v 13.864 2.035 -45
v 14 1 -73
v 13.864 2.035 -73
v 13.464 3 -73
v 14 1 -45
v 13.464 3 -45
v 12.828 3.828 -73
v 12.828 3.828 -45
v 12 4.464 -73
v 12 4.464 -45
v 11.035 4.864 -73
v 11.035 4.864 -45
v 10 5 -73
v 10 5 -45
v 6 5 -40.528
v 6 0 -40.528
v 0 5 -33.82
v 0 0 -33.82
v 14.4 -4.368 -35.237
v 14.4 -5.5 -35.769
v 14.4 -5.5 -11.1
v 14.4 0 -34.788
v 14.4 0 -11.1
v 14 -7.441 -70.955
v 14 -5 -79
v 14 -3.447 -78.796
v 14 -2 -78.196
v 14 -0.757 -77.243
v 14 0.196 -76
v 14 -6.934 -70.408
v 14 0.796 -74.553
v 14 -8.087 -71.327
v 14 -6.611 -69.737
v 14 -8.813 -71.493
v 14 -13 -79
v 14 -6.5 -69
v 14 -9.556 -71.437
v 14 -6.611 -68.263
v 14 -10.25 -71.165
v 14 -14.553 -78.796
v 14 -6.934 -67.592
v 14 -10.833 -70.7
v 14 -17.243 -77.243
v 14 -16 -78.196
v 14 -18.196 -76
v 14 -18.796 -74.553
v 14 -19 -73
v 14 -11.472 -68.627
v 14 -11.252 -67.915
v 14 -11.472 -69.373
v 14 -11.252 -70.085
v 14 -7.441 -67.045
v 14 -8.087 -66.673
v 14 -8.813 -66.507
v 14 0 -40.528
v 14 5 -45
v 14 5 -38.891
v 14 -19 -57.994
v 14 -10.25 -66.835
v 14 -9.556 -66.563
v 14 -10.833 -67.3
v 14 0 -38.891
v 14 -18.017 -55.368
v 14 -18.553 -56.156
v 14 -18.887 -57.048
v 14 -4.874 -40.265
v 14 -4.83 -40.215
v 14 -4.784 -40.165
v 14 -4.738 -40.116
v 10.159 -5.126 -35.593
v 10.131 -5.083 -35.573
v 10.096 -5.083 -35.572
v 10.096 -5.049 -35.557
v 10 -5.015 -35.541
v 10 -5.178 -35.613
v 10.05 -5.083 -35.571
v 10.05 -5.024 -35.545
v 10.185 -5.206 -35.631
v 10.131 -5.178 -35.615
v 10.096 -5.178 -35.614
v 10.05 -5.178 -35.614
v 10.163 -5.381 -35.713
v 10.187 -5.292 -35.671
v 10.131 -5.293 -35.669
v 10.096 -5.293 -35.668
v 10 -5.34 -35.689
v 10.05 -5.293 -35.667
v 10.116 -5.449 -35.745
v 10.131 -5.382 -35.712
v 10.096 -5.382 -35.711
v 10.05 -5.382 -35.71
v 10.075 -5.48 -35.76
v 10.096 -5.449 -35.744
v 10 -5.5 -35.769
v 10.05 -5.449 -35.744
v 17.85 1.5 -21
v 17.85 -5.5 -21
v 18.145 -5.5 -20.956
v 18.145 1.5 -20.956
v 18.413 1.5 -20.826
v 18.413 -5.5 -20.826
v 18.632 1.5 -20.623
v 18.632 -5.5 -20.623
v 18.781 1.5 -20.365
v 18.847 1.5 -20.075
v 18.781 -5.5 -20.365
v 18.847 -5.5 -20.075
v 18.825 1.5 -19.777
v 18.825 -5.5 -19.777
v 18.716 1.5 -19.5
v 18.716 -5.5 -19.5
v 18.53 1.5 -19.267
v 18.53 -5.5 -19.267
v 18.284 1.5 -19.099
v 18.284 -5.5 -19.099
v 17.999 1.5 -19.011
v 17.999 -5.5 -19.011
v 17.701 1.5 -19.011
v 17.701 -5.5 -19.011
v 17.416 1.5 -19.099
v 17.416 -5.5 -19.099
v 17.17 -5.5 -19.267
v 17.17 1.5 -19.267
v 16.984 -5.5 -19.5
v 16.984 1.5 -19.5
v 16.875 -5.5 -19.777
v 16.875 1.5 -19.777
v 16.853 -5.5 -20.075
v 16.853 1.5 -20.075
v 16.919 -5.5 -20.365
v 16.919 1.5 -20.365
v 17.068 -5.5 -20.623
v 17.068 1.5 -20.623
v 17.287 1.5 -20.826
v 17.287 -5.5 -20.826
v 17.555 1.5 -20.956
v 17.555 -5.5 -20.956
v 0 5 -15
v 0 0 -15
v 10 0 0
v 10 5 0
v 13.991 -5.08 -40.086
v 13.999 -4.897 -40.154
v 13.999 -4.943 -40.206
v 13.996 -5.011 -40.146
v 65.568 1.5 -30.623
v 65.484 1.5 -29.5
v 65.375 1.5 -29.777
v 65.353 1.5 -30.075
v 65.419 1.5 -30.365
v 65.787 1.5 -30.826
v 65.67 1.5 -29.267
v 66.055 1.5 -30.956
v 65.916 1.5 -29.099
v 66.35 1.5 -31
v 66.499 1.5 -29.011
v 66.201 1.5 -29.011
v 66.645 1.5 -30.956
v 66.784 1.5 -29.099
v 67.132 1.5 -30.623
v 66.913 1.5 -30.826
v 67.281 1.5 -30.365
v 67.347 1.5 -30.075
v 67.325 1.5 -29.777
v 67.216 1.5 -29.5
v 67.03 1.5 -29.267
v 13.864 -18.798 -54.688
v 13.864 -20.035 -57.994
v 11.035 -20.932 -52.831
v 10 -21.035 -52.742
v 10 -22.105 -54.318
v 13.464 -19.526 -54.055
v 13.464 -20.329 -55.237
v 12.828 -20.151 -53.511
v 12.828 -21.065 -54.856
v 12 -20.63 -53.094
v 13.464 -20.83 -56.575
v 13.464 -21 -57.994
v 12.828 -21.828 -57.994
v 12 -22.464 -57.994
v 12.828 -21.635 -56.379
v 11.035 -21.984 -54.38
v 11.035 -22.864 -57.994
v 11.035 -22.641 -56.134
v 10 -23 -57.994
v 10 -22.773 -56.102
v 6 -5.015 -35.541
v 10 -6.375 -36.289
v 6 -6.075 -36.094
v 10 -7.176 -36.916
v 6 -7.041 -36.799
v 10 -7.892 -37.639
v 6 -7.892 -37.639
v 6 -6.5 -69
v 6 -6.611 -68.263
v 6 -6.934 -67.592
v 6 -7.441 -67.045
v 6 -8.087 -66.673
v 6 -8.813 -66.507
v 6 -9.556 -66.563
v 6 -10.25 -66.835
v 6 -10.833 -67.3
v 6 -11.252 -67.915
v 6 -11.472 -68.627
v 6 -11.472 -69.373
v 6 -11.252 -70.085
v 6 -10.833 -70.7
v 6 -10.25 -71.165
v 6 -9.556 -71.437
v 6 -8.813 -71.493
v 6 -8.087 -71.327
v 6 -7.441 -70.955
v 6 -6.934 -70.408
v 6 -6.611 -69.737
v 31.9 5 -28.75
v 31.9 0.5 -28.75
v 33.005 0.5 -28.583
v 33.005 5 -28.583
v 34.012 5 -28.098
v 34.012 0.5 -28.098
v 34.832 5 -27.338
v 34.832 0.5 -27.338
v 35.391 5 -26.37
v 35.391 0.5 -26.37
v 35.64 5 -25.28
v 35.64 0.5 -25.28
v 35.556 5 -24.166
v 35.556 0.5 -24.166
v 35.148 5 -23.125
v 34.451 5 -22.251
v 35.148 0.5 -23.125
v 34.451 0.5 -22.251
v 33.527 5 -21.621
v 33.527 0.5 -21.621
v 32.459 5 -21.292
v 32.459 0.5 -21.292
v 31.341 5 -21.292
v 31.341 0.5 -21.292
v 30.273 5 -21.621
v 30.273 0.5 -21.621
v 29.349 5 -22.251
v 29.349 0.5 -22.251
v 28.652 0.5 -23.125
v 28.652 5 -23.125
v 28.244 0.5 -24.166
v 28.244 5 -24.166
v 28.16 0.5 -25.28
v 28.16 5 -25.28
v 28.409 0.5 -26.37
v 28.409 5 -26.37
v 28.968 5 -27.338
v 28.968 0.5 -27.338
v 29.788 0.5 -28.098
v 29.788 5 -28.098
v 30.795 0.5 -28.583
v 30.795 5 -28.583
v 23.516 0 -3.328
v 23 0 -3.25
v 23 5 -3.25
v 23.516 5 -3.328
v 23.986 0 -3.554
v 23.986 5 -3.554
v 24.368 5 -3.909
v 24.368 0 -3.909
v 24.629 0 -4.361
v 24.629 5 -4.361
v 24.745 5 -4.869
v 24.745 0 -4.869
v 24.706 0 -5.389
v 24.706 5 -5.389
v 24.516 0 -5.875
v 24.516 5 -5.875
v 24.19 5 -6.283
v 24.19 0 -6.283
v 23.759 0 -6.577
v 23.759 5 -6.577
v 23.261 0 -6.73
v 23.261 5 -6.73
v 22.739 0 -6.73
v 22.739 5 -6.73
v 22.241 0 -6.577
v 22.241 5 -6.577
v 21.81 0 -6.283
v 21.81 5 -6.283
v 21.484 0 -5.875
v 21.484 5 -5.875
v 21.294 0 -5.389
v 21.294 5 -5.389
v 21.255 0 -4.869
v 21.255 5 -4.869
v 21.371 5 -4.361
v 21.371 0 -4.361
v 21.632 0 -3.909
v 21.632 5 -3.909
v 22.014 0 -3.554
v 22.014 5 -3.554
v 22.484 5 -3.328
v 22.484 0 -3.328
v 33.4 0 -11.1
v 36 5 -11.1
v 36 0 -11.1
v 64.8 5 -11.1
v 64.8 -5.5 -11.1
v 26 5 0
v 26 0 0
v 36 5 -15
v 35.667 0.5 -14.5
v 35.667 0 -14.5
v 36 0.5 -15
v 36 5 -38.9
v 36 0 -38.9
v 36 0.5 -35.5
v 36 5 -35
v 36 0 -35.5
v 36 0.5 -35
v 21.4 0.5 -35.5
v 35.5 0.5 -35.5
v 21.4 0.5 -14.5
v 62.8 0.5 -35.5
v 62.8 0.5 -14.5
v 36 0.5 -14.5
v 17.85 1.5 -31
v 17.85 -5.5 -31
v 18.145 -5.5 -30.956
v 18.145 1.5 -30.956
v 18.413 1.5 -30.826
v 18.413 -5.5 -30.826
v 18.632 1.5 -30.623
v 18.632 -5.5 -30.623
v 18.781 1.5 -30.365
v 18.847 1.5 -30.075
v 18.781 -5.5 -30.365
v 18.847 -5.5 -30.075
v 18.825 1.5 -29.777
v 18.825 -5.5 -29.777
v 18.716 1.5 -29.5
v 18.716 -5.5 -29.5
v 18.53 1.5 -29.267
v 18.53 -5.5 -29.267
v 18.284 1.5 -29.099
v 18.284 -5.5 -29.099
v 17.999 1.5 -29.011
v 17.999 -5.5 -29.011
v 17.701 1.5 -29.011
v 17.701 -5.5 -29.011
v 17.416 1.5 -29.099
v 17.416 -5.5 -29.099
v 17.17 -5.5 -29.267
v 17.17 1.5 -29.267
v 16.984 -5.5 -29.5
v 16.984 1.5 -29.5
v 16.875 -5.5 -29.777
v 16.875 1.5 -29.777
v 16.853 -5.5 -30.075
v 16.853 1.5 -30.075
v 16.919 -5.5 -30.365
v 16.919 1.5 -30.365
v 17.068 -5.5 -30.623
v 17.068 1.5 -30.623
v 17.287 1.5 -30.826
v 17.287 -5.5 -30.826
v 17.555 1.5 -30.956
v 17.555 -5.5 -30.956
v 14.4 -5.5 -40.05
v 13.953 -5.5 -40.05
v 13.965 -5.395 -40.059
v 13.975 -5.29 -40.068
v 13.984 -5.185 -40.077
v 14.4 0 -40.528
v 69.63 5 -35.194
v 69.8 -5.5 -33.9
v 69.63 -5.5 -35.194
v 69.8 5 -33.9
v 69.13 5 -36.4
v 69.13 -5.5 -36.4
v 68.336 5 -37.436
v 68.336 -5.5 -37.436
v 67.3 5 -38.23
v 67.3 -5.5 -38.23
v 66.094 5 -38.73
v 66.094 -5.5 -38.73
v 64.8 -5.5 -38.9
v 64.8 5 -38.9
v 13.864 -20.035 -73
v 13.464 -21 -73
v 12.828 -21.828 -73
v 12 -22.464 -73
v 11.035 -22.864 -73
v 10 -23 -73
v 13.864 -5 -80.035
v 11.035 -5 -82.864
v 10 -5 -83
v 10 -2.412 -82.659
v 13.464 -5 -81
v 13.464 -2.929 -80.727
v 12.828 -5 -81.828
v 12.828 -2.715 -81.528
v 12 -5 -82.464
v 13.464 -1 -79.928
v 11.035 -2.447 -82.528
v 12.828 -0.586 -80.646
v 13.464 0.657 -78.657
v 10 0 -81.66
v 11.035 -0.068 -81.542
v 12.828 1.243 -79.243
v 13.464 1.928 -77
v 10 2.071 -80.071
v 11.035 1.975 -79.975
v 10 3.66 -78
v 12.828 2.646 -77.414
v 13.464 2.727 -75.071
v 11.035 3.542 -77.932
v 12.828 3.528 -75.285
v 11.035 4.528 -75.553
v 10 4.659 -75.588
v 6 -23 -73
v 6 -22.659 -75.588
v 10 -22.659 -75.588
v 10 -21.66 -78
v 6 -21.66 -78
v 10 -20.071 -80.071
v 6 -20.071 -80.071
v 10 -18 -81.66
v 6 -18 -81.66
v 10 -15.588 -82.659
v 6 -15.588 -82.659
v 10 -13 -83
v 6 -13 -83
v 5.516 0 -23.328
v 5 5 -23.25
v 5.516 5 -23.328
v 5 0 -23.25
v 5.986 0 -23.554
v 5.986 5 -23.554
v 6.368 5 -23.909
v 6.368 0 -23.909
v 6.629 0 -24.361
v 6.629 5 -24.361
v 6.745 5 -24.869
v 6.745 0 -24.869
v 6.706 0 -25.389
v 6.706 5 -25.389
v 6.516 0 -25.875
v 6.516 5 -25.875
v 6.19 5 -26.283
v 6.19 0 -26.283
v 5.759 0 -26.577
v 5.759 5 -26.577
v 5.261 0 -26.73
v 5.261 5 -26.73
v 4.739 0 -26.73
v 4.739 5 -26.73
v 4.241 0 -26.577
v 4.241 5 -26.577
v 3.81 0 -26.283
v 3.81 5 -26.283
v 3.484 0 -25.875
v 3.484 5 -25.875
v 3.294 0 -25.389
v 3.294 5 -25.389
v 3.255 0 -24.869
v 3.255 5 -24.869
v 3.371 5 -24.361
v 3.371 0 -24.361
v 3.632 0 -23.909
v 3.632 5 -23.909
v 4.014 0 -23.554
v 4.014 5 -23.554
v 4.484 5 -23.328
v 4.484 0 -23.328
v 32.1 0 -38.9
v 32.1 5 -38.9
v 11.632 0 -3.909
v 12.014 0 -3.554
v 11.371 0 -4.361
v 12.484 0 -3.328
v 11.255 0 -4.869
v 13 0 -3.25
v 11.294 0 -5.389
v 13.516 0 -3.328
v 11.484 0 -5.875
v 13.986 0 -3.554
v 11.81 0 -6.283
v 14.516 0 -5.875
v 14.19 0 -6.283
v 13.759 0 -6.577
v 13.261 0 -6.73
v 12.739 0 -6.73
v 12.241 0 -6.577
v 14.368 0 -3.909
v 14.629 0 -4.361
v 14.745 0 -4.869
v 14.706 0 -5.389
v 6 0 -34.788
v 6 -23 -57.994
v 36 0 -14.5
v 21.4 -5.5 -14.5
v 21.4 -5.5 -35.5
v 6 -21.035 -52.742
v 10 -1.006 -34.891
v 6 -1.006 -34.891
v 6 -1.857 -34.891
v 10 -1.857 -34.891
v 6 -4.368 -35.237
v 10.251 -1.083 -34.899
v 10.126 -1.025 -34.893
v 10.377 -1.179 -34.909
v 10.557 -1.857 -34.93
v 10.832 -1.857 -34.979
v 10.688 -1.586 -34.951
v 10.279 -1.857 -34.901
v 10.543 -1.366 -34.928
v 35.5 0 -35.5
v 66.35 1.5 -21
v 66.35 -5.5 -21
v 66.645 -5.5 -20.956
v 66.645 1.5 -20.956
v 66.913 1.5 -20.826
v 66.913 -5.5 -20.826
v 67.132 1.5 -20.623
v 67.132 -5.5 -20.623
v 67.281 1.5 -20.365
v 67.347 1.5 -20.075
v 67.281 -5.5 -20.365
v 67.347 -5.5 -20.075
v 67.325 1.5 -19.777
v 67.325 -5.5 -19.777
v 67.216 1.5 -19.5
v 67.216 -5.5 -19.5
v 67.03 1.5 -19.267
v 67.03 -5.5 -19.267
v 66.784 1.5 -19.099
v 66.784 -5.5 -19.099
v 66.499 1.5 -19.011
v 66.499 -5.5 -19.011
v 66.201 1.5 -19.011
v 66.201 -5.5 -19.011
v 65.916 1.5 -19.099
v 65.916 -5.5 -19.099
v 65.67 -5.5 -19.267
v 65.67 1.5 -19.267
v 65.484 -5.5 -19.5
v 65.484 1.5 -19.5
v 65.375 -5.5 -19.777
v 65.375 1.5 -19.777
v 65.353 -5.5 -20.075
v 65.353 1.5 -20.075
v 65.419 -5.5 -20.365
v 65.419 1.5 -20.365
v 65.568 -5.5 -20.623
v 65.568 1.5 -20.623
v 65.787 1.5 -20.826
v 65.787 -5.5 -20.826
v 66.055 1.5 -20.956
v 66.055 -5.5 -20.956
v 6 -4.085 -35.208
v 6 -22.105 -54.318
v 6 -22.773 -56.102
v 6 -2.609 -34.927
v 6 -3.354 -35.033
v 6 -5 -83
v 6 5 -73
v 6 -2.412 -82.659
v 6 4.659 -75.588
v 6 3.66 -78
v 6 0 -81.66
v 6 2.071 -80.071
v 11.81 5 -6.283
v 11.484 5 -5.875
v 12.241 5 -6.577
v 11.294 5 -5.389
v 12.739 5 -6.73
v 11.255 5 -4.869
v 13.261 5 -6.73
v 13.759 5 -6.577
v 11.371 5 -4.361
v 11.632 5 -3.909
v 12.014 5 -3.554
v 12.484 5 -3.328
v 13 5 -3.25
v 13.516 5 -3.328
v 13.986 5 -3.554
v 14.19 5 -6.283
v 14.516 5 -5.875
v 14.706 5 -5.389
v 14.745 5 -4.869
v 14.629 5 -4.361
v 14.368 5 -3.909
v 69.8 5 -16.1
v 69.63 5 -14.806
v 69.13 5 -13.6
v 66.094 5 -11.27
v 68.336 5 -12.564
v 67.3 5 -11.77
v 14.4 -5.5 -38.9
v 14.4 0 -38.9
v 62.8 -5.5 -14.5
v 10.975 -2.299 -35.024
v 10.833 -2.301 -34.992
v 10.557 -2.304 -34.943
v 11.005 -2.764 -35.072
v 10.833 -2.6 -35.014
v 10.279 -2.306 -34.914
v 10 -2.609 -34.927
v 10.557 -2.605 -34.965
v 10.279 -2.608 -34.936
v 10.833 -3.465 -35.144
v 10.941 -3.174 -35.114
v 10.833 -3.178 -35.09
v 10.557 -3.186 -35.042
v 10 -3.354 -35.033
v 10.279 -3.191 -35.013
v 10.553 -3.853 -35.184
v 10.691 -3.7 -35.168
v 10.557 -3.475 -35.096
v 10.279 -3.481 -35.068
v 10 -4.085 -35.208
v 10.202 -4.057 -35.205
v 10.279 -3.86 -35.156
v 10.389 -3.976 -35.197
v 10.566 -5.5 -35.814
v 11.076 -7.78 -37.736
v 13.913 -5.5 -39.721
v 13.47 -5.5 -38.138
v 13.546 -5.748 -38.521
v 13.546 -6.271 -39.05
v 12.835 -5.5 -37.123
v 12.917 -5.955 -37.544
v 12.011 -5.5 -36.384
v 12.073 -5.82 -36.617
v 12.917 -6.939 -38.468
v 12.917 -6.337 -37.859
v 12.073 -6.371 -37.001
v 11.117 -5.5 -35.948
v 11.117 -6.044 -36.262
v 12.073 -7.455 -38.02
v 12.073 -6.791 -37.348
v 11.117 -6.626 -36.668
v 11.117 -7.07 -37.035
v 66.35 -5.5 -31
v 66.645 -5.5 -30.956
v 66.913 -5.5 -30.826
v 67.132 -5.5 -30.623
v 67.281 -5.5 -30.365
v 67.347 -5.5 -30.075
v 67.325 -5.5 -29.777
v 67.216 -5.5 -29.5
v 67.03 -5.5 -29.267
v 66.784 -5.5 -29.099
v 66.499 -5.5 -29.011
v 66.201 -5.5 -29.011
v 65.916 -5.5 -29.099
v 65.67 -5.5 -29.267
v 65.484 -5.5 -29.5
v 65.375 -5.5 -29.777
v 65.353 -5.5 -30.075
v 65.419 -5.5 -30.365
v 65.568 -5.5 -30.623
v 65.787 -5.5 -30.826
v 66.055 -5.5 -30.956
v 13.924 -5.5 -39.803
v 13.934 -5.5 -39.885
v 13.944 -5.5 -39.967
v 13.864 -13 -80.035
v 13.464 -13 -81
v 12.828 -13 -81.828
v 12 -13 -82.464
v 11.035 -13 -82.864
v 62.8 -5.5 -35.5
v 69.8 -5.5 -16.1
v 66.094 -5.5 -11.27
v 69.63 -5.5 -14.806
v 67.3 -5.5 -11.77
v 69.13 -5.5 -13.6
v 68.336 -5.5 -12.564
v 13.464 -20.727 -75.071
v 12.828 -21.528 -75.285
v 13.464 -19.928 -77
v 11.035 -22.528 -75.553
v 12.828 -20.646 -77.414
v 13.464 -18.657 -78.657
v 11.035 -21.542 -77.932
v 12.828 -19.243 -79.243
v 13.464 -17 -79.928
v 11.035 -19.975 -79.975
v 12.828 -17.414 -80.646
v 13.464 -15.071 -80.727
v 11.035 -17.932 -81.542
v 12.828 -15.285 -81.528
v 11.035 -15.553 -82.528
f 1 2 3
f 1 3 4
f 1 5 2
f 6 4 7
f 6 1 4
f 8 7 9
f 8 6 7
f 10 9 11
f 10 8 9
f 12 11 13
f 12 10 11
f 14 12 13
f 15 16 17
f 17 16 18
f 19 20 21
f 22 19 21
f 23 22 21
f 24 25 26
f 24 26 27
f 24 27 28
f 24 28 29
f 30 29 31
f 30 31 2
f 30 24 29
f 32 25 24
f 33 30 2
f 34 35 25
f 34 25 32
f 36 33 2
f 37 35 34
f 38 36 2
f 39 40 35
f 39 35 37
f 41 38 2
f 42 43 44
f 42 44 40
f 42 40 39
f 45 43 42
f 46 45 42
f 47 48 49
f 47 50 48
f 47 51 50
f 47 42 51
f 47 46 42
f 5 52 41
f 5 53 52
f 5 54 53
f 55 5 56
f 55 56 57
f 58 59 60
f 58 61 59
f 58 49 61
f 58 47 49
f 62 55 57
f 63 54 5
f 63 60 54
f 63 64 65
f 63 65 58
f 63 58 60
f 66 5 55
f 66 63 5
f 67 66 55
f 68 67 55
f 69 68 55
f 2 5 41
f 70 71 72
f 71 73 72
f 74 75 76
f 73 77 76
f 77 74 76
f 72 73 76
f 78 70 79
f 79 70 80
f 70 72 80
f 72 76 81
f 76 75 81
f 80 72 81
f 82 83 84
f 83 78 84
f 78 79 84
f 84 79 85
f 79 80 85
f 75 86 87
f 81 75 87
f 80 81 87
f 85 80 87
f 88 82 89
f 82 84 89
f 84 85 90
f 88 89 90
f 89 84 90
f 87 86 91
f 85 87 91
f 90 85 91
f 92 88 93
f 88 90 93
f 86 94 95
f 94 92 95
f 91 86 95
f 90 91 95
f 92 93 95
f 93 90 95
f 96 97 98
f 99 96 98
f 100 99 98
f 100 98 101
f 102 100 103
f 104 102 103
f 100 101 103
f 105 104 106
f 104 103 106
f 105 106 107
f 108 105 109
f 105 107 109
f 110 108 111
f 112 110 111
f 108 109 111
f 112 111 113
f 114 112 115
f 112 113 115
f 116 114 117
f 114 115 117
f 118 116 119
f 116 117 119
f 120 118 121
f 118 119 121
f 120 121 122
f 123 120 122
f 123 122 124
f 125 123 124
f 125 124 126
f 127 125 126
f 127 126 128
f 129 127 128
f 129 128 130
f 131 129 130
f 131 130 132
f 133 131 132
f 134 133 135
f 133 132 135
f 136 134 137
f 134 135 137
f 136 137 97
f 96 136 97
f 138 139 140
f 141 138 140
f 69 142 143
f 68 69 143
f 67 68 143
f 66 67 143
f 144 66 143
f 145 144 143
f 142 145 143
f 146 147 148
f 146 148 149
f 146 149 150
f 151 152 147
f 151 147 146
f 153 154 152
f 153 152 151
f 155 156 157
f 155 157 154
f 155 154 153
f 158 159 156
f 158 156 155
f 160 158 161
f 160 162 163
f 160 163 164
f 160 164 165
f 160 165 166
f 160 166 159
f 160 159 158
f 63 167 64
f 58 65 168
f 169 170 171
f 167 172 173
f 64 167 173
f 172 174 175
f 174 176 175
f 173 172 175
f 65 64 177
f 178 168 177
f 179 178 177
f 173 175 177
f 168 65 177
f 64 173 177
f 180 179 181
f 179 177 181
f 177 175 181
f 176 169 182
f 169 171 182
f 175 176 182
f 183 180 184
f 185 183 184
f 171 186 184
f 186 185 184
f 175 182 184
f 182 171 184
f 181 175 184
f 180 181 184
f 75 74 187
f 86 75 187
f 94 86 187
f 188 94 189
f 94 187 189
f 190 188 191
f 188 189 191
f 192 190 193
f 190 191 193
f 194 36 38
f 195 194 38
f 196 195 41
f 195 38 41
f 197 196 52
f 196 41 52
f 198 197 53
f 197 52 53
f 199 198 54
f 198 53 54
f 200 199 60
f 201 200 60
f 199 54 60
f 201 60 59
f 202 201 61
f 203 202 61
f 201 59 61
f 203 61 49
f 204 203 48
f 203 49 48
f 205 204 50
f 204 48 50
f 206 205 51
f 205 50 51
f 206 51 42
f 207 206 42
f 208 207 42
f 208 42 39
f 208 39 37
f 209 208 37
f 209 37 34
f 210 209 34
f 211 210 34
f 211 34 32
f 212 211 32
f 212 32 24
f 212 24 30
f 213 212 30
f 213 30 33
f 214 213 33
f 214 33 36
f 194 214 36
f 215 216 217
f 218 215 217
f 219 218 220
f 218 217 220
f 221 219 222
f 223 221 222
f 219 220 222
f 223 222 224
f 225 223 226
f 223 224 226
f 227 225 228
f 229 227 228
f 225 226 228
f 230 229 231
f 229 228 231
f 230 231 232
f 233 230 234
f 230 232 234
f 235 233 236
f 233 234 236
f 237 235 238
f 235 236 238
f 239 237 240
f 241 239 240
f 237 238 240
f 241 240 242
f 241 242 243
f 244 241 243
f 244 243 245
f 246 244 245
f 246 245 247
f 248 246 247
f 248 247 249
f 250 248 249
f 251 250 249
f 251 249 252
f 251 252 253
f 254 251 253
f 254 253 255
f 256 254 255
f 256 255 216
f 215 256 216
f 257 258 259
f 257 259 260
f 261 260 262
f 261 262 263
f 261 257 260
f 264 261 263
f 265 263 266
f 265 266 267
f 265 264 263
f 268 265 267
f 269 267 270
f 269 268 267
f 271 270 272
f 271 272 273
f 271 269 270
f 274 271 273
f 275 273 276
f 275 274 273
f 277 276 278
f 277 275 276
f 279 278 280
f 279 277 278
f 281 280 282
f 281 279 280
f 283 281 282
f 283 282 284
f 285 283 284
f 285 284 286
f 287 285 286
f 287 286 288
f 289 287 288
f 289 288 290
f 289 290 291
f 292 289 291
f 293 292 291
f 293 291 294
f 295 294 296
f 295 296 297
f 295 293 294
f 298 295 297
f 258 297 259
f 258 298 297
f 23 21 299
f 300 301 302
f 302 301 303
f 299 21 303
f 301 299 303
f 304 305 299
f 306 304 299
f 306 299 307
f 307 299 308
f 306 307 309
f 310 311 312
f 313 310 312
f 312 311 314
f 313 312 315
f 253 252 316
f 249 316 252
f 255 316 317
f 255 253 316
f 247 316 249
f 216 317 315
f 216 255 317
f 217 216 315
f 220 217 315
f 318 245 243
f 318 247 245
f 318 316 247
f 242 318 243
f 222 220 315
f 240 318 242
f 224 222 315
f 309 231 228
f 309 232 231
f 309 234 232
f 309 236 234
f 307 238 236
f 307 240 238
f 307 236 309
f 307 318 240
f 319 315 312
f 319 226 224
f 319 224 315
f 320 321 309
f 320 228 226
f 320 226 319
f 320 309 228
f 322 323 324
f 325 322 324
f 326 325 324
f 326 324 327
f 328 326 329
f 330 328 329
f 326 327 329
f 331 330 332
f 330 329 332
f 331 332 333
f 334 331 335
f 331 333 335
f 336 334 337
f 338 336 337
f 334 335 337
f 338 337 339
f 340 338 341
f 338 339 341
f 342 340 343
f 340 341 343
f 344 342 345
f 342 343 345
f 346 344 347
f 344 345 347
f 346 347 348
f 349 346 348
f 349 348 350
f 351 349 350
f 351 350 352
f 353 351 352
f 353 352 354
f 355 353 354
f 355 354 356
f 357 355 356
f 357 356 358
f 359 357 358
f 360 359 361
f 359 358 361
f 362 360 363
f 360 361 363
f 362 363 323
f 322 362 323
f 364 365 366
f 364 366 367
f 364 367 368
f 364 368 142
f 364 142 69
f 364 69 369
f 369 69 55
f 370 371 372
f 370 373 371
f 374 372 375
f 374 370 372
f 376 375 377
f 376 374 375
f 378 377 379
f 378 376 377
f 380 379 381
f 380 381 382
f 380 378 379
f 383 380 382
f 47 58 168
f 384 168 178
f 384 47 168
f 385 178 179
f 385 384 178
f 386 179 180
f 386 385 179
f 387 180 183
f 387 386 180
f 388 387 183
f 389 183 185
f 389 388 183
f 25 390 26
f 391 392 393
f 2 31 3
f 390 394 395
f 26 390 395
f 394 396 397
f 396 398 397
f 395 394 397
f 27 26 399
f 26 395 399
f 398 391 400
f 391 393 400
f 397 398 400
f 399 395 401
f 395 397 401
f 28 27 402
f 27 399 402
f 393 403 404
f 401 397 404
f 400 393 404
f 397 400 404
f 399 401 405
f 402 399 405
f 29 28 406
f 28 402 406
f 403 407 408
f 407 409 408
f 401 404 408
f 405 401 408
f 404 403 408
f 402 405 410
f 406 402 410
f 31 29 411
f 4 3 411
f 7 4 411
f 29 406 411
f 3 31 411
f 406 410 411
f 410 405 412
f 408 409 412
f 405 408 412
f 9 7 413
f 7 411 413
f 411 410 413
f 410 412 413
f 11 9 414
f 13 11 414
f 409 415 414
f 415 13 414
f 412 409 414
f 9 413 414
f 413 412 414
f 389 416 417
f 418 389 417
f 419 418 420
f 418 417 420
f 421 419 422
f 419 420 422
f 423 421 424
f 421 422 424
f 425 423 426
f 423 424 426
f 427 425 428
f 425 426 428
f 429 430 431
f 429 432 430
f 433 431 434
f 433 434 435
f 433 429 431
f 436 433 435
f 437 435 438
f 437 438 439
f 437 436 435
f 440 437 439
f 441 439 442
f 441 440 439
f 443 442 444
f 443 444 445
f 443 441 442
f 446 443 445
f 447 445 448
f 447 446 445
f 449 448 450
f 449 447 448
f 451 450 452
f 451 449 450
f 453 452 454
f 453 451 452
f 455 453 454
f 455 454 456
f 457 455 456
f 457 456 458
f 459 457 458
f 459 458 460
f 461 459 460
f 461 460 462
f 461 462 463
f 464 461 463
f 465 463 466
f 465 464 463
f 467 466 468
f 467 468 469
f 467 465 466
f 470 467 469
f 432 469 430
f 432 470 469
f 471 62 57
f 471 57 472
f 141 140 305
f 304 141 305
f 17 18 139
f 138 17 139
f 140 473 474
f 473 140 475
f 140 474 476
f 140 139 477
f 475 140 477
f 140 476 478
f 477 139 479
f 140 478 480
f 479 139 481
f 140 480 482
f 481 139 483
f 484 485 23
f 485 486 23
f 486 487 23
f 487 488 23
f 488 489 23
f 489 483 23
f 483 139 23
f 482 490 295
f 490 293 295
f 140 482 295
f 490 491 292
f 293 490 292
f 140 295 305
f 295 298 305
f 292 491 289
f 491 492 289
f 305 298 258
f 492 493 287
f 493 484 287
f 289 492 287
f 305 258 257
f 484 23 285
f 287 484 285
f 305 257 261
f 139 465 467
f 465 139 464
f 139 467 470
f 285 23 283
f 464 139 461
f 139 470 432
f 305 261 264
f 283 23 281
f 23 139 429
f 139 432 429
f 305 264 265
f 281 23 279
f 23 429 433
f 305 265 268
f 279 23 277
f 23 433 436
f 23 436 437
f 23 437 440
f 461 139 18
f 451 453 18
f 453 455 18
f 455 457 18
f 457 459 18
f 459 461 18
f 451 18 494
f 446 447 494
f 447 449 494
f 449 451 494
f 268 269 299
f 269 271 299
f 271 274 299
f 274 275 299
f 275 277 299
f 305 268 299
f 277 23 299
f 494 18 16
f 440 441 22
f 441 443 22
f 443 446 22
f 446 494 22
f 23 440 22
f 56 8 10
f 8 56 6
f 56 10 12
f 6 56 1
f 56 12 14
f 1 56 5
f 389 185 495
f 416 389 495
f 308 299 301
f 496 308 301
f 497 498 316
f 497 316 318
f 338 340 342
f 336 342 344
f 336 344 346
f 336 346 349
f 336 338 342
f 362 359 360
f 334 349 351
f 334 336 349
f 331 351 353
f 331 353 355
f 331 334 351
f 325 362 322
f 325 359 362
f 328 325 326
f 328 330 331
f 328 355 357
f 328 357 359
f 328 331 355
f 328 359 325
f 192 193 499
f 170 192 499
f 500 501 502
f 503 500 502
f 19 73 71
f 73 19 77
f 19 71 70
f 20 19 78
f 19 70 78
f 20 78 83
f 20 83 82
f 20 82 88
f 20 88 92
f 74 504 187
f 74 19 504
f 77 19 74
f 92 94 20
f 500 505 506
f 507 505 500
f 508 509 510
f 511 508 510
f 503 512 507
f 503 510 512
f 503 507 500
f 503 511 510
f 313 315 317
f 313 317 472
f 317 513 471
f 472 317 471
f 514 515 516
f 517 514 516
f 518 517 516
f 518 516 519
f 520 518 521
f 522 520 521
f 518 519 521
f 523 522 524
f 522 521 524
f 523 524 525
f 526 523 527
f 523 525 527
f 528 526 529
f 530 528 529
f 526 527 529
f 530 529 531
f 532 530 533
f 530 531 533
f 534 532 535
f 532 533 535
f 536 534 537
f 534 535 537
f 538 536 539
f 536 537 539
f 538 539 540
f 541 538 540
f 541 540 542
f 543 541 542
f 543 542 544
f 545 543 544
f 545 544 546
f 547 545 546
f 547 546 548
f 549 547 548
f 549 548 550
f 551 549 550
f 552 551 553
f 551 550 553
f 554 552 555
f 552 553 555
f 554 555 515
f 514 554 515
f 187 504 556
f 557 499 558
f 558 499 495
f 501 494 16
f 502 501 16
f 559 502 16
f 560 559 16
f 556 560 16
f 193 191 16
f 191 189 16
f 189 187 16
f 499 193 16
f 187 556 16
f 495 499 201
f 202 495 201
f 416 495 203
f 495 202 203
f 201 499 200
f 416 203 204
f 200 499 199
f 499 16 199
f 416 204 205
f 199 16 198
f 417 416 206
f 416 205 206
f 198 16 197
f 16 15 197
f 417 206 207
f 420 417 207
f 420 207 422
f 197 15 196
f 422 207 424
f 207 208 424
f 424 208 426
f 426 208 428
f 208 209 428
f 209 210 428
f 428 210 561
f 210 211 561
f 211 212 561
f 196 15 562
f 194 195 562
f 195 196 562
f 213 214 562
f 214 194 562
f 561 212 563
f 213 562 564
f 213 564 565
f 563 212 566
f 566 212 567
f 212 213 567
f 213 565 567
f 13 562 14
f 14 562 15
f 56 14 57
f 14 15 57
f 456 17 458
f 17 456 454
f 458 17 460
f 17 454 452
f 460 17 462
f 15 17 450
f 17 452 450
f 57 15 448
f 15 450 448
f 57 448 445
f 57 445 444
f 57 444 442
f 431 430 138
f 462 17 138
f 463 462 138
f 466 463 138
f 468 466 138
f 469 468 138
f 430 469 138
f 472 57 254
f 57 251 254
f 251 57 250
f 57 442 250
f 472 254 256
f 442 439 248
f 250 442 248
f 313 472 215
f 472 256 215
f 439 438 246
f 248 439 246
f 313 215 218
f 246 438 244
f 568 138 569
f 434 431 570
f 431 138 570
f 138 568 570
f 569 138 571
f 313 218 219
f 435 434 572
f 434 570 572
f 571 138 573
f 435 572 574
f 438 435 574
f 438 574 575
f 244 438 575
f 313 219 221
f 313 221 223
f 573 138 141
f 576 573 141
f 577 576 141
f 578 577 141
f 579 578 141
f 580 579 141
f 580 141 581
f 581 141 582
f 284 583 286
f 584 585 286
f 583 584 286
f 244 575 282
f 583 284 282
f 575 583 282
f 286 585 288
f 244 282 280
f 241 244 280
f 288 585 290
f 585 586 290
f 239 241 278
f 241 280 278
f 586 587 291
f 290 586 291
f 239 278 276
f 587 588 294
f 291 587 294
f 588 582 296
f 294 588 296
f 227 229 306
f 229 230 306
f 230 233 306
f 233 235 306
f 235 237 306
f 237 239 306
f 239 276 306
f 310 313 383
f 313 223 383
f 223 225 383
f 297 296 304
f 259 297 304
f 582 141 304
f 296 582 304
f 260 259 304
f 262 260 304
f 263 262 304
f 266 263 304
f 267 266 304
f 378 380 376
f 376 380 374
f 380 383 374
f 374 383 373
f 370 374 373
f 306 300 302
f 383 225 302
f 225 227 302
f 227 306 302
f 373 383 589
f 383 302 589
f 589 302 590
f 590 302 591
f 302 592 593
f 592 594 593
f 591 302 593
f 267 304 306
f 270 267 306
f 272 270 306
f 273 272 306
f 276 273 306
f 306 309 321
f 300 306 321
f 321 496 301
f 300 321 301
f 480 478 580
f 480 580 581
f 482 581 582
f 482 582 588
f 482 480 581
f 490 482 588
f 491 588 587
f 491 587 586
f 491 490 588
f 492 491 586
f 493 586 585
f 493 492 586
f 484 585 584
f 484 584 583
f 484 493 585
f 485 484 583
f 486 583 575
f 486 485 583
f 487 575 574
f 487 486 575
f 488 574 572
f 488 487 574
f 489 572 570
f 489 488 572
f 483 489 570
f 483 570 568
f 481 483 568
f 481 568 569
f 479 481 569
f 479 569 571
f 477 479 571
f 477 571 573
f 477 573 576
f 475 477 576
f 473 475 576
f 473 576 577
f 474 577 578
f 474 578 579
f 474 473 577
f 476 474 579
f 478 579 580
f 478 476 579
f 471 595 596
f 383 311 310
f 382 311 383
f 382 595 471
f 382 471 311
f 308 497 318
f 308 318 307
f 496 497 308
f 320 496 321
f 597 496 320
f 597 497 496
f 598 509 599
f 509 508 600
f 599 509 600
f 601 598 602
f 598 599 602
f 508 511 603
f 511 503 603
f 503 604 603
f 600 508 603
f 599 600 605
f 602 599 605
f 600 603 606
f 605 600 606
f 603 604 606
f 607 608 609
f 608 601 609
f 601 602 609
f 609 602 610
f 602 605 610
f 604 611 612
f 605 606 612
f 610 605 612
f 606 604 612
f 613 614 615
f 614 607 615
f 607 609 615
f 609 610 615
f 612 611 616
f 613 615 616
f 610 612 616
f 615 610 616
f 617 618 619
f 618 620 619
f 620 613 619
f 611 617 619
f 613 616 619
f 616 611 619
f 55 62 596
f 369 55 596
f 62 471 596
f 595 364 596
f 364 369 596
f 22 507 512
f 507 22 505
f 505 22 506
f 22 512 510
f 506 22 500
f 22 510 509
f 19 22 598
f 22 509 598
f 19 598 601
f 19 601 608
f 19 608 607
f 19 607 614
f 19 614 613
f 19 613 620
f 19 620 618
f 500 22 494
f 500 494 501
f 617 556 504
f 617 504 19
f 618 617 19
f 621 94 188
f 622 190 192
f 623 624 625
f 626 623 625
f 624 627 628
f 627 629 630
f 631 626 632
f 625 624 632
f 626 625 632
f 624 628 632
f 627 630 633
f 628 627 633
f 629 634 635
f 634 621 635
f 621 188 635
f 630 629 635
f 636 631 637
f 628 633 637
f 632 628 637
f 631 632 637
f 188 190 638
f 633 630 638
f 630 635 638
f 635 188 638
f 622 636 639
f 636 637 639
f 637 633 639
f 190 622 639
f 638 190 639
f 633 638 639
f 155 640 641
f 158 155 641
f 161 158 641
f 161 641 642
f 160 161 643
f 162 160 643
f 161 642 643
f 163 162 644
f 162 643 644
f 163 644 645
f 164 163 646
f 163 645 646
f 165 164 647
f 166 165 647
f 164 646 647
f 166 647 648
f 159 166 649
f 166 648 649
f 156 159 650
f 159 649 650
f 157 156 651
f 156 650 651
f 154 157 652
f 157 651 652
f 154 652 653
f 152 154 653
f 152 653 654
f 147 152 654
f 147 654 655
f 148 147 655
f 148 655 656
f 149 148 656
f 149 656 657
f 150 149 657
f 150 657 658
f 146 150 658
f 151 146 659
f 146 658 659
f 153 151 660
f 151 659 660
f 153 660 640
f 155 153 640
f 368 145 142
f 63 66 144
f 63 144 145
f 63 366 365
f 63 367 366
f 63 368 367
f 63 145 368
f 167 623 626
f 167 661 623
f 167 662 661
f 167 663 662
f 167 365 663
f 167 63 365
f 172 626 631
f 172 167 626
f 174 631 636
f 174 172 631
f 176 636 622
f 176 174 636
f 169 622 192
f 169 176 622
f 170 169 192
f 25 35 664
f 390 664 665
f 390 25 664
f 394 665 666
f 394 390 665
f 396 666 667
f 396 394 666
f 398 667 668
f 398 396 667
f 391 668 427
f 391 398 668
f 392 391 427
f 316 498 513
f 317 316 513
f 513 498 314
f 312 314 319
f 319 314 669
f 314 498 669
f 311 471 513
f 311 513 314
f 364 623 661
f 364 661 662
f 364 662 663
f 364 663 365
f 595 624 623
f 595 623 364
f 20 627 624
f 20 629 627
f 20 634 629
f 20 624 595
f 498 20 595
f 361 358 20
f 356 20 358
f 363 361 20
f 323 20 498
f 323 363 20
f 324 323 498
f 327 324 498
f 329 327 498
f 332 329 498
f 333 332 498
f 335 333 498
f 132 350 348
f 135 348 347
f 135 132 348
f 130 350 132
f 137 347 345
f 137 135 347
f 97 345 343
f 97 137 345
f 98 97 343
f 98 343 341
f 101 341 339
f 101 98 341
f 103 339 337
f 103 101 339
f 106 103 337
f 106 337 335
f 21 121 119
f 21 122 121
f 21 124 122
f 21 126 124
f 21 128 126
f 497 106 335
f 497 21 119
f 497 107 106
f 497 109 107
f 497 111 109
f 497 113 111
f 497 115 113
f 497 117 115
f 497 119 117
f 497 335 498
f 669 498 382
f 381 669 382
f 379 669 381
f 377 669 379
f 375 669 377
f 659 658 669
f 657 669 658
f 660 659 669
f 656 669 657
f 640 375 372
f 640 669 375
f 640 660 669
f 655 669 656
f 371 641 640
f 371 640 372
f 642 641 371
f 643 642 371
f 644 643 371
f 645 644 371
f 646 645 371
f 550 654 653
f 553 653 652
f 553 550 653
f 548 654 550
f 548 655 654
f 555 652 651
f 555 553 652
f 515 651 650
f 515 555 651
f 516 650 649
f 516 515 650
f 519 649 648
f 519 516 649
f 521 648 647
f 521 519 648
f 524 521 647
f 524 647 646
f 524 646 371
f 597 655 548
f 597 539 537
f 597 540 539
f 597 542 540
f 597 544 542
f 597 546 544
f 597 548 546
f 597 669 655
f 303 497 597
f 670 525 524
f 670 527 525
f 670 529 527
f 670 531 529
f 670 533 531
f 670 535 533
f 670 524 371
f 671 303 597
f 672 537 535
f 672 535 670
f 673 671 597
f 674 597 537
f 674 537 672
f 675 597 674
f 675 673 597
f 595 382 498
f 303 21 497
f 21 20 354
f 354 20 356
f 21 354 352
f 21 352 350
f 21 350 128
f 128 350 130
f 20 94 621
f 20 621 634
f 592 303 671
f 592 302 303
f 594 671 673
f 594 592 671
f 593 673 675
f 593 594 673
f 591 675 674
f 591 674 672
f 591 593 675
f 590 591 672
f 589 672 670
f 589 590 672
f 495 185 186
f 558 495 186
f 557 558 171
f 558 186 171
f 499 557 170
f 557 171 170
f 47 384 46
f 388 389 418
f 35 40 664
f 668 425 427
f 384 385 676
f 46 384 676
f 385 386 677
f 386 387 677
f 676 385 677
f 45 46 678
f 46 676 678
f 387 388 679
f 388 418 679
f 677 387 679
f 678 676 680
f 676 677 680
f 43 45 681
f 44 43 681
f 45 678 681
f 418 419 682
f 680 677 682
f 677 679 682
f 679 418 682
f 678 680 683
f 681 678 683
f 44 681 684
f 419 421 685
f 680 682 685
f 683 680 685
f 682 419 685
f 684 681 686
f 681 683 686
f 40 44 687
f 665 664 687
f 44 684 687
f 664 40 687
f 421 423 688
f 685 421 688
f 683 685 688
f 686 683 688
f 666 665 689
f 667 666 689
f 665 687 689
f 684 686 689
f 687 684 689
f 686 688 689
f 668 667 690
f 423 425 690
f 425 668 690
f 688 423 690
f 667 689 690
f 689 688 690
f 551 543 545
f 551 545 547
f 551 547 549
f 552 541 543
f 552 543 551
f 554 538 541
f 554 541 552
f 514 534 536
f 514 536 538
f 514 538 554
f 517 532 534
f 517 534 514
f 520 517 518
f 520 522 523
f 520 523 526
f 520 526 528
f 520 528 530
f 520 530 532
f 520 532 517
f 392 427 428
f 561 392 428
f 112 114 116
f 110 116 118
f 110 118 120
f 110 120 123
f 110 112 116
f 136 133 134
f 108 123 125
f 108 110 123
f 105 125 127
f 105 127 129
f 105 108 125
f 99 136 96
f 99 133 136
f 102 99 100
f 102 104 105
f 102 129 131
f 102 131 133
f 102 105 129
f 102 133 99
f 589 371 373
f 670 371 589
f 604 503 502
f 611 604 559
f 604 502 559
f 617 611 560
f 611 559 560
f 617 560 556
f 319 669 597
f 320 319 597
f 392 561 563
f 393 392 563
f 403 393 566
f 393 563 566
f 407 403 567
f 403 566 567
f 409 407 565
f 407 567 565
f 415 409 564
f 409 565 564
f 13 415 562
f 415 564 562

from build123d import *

# Parameters (mm, degrees)
SKETCH1_R               = 1.75
SKETCH1_W               = 7.2
SKETCH1_H               = 10.8
BOSS_EXTRUDE2_DEPTH     = 5
FILLET1_R               = 5.4
FILLET2_R               = 5.4
FILLET3_RADIUS          = 10
FILLET3_LENGTH          = 5
SKETCH2_W               = 35
SKETCH2_H               = 19.782608696
SKETCH2_W_2             = 23
SKETCH2_H_2             = 13
BOSS_EXTRUDE3_DEPTH     = 5.5
SKETCH3_W               = 23
SKETCH3_H               = 13
CUT_EXTRUDE1_DEPTH      = 3.5
CUT_EXTRUDE2_DEPTH      = 76.201396264
CUT_EXTRUDE2_DEPTH_BACK = 76.201396264
SKETCH6_W               = 13.4
SKETCH6_H               = 0.108695652
CUT_EXTRUDE3_DEPTH      = 13.5
SKETCH7_W               = 8
SKETCH7_H               = 28
BOSS_EXTRUDE5_DEPTH     = 38
SKETCH8_R               = 2.5
CUT_EXTRUDE4_DEPTH      = 32
FILLET5_R               = 10
SKETCH9_R               = 1
CUT_EXTRUDE5_DEPTH      = 7
BOSS_EXTRUDE6_START     = -8
BOSS_EXTRUDE6_DEPTH     = 8
CUT_EXTRUDE8_DEPTH      = 97.444595494
FILLET8_R               = 8
FILLET10_R              = 4
BOSS_EXTRUDE7_START     = -1.5
BOSS_EXTRUDE7_OUTLINE_W = 23
BOSS_EXTRUDE7_OUTLINE_H = 13
BOSS_EXTRUDE7_DEPTH     = 1.5
SKETCH15_R              = 1
BOSS_EXTRUDE8_DEPTH     = 7
SKETCH16_W              = 23
SKETCH16_H              = 13
BOSS_EXTRUDE9_DEPTH     = 9
SKETCH23_W              = 22.4
SKETCH23_H              = 19.782608696
BOSS_EXTRUDE11_DEPTH    = 10.5
SKETCH32_W              = 2
SKETCH32_H              = 19.782608696
CUT_EXTRUDE10_DEPTH     = 112.132758447
SKETCH33_W              = 21.6
SKETCH33_H              = 4.008695652
BOSS_EXTRUDE26_DEPTH    = 5.5
SKETCH34_W              = 33.8
SKETCH34_H              = 4.008695652
BOSS_EXTRUDE27_DEPTH    = 10.5
SKETCH39_W              = 41.4
SKETCH39_H              = 21
CUT_EXTRUDE15_DEPTH     = 6
SKETCH40_R              = 1
CUT_EXTRUDE16_DEPTH     = 7
SKETCH41_R              = 1.75
SKETCH41_R_2            = 3.75
CUT_EXTRUDE17_DEPTH     = 111.965264835
CUT_EXTRUDE18_DEPTH     = 10
FILLET12_R              = 5
BOSS_EXTRUDE28_REACH    = 109.184


with BuildPart() as part:
    # Sketch1 → Boss-Extrude2 (new body)
    # profile 1 of 2: a face of its own
    with BuildSketch(Plane(origin=(0, 0, 0), x_dir=(1, 0, 0), z_dir=(0, 1, 0))):
        Polygon((26, 45), (10, 45), (0, 33.819660113), (0, 15), (10, 0), (26, 0), (36, 15), (60, 15), (60, 35), (36, 35), align=None)
        with Locations(Location((13, 5, 0), (0, 0, 270))):
            Circle(SKETCH1_R, mode=Mode.SUBTRACT)
        with Locations(Location((23, 5, 0), (0, 0, 270))):
            Circle(SKETCH1_R, mode=Mode.SUBTRACT)
        with Locations(Location((5, 25, 0), (0, 0, 270))):
            Circle(SKETCH1_R, mode=Mode.SUBTRACT)
        Polygon((26.5, 30.4), (37.3, 30.4), (44.5, 30.4), (44.5, 19.6), (37.3, 19.6), (26.5, 19.6), align=None, mode=Mode.SUBTRACT)
    # profile 2 of 2: a face of its own
    with BuildSketch(Plane(origin=(0, 0, 0), x_dir=(1, 0, 0), z_dir=(0, 1, 0))):
        with Locations((40.9, 25)):
            Rectangle(SKETCH1_W, SKETCH1_H)
    extrude(amount=BOSS_EXTRUDE2_DEPTH)

    # Fillet1
    fillet1_edges = [part.edges().sort_by_distance(p)[0] for p in [
        (37.3, 2.5, -19.6),
        (37.3, 2.5, -30.4),
    ]]
    fillet(fillet1_edges, radius=FILLET1_R - 0.0001)  # a hair under: the kernel refuses the full size

    # Fillet2
    fillet2_edges = [part.edges().sort_by_distance(p)[0] for p in [
        (26.5, 2.5, -30.4),
        (26.5, 2.5, -19.6),
    ]]
    fillet(fillet2_edges, radius=FILLET2_R - 0.0001)  # a hair under: the kernel refuses the full size

    # Fillet3: full round fillet: the end face becomes a half cylinder, R = half its width
    fillet3_face = Plane((60, 2.5, -25), x_dir=(0, 1, 0), z_dir=(1, 0, 0))  # on the end face: x along it, z out of the body
    fillet3_slab = fillet3_face.offset(-FILLET3_RADIUS / 2) * Box(FILLET3_LENGTH, 2 * FILLET3_RADIUS, FILLET3_RADIUS, mode=Mode.PRIVATE)  # the body's end, R deep
    fillet3_round = Plane((50, 2.5, -25), x_dir=(1, 0, 0), z_dir=(0, 1, 0)) * Cylinder(FILLET3_RADIUS, FILLET3_LENGTH, mode=Mode.PRIVATE)  # its axis R under the face
    add(fillet3_slab - fillet3_round, mode=Mode.SUBTRACT)

    # Sketch2 → Boss-Extrude3 (add)
    with BuildSketch(Plane.XZ):
        with Locations((31.9, -25)):
            Rectangle(SKETCH2_W, SKETCH2_H)
        with Locations((31.9, -25)):
            Rectangle(SKETCH2_W_2, SKETCH2_H_2, mode=Mode.SUBTRACT)
    extrude(amount=BOSS_EXTRUDE3_DEPTH)

    # Sketch3 → Cut-Extrude1 (cut)
    with BuildSketch(Plane.XZ):
        with Locations((31.9, -25)):
            Rectangle(SKETCH3_W, SKETCH3_H)
    extrude(amount=-CUT_EXTRUDE1_DEPTH, mode=Mode.SUBTRACT)

    # Sketch4 → Cut-Extrude2 (cut, two sides: drawn at the far end of the back side and taken through both)
    with BuildSketch(Plane.XZ.offset(-CUT_EXTRUDE2_DEPTH_BACK)):
        with BuildLine():
            Line((49.4, -15), (49.4, -35))
            Line((49.4, -35), (50, -35))
            ThreePointArc((50, -35), (60, -25), (50, -15))
            Line((50, -15), (49.4, -15))
        make_face()
    extrude(amount=CUT_EXTRUDE2_DEPTH + CUT_EXTRUDE2_DEPTH_BACK, mode=Mode.SUBTRACT)

    # Sketch6 → Cut-Extrude3 (cut)
    with BuildSketch(Plane.XZ):
        with Locations((42.7, -34.945652174)):
            Rectangle(SKETCH6_W, SKETCH6_H)
        with Locations((42.7, -15.054347826)):
            Rectangle(SKETCH6_W, SKETCH6_H)
    extrude(amount=-CUT_EXTRUDE3_DEPTH, mode=Mode.SUBTRACT)

    # Sketch7 → Boss-Extrude5 (add)
    with BuildSketch(Plane(origin=(0, 0, -45), x_dir=(-1, 0, 0), z_dir=(0, 0, -1))):
        with Locations((-10, -9)):
            Rectangle(SKETCH7_W, SKETCH7_H)
    extrude(amount=BOSS_EXTRUDE5_DEPTH)

    # Sketch8 → Cut-Extrude4 (cut)
    with BuildSketch(Plane(origin=(14, 0, 0), x_dir=(0, 0, -1), z_dir=(1, 0, 0))):
        with Locations(Location((69, -9, 0), (0, 0, 90))):
            Circle(SKETCH8_R)
    extrude(amount=-CUT_EXTRUDE4_DEPTH, mode=Mode.SUBTRACT)

    # Fillet5
    fillet5_edges = [part.edges().sort_by_distance(p)[0] for p in [
        (10, -23, -83),
        (10, 5, -83),
    ]]
    fillet(fillet5_edges, radius=FILLET5_R)

    # Sketch9 → Cut-Extrude5 (cut)
    with BuildSketch(Plane.XZ.offset(5.5)):
        with Locations(Location((18.1, -25, 0), (0, 0, 270))):
            Circle(SKETCH9_R)
        with Locations(Location((45.7, -25, 0), (0, 0, 270))):
            Circle(SKETCH9_R)
    extrude(amount=-CUT_EXTRUDE5_DEPTH, mode=Mode.SUBTRACT)

    # Sketch10 → Boss-Extrude6 (add)
    with BuildSketch(Plane.ZY.offset(-6).offset(BOSS_EXTRUDE6_START)):
        Polygon((-45, -23), (-45, 5), (-34.891304348, 5), (-34.891304348, -5.5), align=None)
    extrude(amount=BOSS_EXTRUDE6_DEPTH)

    # Sketch13 → Cut-Extrude8 (cut, through all)
    with BuildSketch(Plane.ZY.offset(-6)):
        Polygon((-45, -23), (-34.891304348, -5.5), (-55, -23), align=None)
    extrude(amount=-CUT_EXTRUDE8_DEPTH, mode=Mode.SUBTRACT)

    # Fillet8
    fillet8_edges = [part.edges().sort_by_distance(p)[0] for p in [
        (10, -5.5, -34.891304348),
        (10, -23, -55),
    ]]
    fillet(fillet8_edges, radius=FILLET8_R)

    # Fillet10
    fillet10_edges = [part.edges().sort_by_distance(p)[0] for p in [
        (14, -9, -83),
        (14, -23, -65.496815266),
        (14, 5, -59),
        (14, -20.071067812, -80.071067812),
        (14, 2.071067812, -80.071067812),
        (14, -14.463184152, -45.19061533),
        (14, -0.928447255, -34.891304348),
        (14, -22.492592848, -55.189873693),
        (14, -5.172402248, -35.610685663),
    ]]
    fillet(fillet10_edges, radius=FILLET10_R)

    # Boss-Extrude7: read off the stored shape, not the designer's step
    # Boss-Extrude7 outline → Boss-Extrude7 (add)
    with BuildSketch(Plane.XZ.offset(-3.5).offset(BOSS_EXTRUDE7_START)):
        with Locations((31.9, -25)):
            Rectangle(BOSS_EXTRUDE7_OUTLINE_W, BOSS_EXTRUDE7_OUTLINE_H)
    extrude(amount=BOSS_EXTRUDE7_DEPTH)

    # Sketch15 → Boss-Extrude8 (add)
    with BuildSketch(Plane.XZ.offset(5.5)):
        with Locations((18.1, -25)):
            Circle(SKETCH15_R)
        with Locations((45.7, -25)):
            Circle(SKETCH15_R)
    extrude(amount=-BOSS_EXTRUDE8_DEPTH)

    # Sketch16 → Boss-Extrude9 (add)
    with BuildSketch(Plane.XZ.offset(-3.5)):
        with Locations((31.9, -25)):
            Rectangle(SKETCH16_W, SKETCH16_H)
    extrude(amount=BOSS_EXTRUDE9_DEPTH)

    # Sketch23 → Boss-Extrude11 (add)
    with BuildSketch(Plane.XZ.offset(5.5)):
        with Locations((60.6, -25)):
            Rectangle(SKETCH23_W, SKETCH23_H)
    extrude(amount=-BOSS_EXTRUDE11_DEPTH)

    # Sketch32 → Cut-Extrude10 (cut, through all)
    with BuildSketch(Plane.XZ.offset(5.5)):
        with Locations((70.8, -25)):
            Rectangle(SKETCH32_W, SKETCH32_H)
    extrude(amount=-CUT_EXTRUDE10_DEPTH, mode=Mode.SUBTRACT)

    # Sketch33 → Boss-Extrude26 (add)
    with BuildSketch(Plane.XZ.offset(5.5)):
        with Locations((25.2, -13.104347826)):
            Rectangle(SKETCH33_W, SKETCH33_H)
        with Locations((25.2, -36.895652174)):
            Rectangle(SKETCH33_W, SKETCH33_H)
    extrude(amount=-BOSS_EXTRUDE26_DEPTH)

    # Sketch34 → Boss-Extrude27 (add)
    with BuildSketch(Plane.XZ.offset(5.5)):
        with Locations((52.9, -13.104347826)):
            Rectangle(SKETCH34_W, SKETCH34_H)
        with Locations((52.9, -36.895652174)):
            Rectangle(SKETCH34_W, SKETCH34_H)
    extrude(amount=-BOSS_EXTRUDE27_DEPTH)

    # Sketch39 → Cut-Extrude15 (cut)
    with BuildSketch(Plane.XZ.offset(5.5)):
        with Locations((42.1, -25)):
            Rectangle(SKETCH39_W, SKETCH39_H)
    extrude(amount=-CUT_EXTRUDE15_DEPTH, mode=Mode.SUBTRACT)

    # Sketch40 → Cut-Extrude16 (cut)
    with BuildSketch(Plane.XZ.offset(5.5)):
        with Locations(Location((66.35, -30, 0), (0, 0, 270))):
            Circle(SKETCH40_R)
        with Locations(Location((66.35, -20, 0), (0, 0, 270))):
            Circle(SKETCH40_R)
        with Locations(Location((17.85, -30, 0), (0, 0, 270))):
            Circle(SKETCH40_R)
        with Locations(Location((17.85, -20, 0), (0, 0, 270))):
            Circle(SKETCH40_R)
    extrude(amount=-CUT_EXTRUDE16_DEPTH, mode=Mode.SUBTRACT)

    # Sketch41 → Cut-Extrude17 (cut, through all)
    with BuildSketch(Plane.XZ.offset(-0.5)):
        with Locations(Location((5, -25, 0), (0, 0, 90))):
            Circle(SKETCH41_R)
        with Locations(Location((31.9, -25, 0), (0, 0, 270))):
            Circle(SKETCH41_R_2)
    extrude(amount=-CUT_EXTRUDE17_DEPTH, mode=Mode.SUBTRACT)

    # Sketch42 → Cut-Extrude18 (cut)
    with BuildSketch(Plane(origin=(0, 0, 0), x_dir=(1, 0, 0), z_dir=(0, 1, 0))):
        Polygon((14, 45), (14, 38.891304348), (32.1, 38.9), (26, 45), align=None)
    extrude(amount=CUT_EXTRUDE18_DEPTH, mode=Mode.SUBTRACT)

    # Fillet12
    fillet12_edges = [part.edges().sort_by_distance(p)[0] for p in [
        (69.8, -0.25, -11.1),
        (69.8, -0.25, -38.9),
    ]]
    fillet(fillet12_edges, radius=FILLET12_R)

    # Boss-Extrude28: up to this face of the body (flat: up to its plane)
    boss_extrude28_end = Plane(part.part.faces().sort_by_distance((14.4, -2.75, -25))[0])
    # Sketch44 → Boss-Extrude28 (add, up to the picked face)
    with BuildSketch(Plane.ZY.offset(-6), mode=Mode.PRIVATE) as boss_extrude28_sk1:
        Polygon((-40.527864045, 0), (-34.78782211, 0), (-35.237020655, -4.368087235), (-35.768960465, -5.5), (-40.049862217, -5.5), align=None)
    boss_extrude28_tool1 = split(extrude(boss_extrude28_sk1.sketch, amount=-BOSS_EXTRUDE28_REACH, mode=Mode.PRIVATE), bisect_by=boss_extrude28_end, keep=Keep.BOTH, mode=Mode.PRIVATE)
    add(boss_extrude28_tool1.solids().sort_by(Axis((6, -2.637977, -37.697403), (1, 0, 0)))[0])


solid = part.part
